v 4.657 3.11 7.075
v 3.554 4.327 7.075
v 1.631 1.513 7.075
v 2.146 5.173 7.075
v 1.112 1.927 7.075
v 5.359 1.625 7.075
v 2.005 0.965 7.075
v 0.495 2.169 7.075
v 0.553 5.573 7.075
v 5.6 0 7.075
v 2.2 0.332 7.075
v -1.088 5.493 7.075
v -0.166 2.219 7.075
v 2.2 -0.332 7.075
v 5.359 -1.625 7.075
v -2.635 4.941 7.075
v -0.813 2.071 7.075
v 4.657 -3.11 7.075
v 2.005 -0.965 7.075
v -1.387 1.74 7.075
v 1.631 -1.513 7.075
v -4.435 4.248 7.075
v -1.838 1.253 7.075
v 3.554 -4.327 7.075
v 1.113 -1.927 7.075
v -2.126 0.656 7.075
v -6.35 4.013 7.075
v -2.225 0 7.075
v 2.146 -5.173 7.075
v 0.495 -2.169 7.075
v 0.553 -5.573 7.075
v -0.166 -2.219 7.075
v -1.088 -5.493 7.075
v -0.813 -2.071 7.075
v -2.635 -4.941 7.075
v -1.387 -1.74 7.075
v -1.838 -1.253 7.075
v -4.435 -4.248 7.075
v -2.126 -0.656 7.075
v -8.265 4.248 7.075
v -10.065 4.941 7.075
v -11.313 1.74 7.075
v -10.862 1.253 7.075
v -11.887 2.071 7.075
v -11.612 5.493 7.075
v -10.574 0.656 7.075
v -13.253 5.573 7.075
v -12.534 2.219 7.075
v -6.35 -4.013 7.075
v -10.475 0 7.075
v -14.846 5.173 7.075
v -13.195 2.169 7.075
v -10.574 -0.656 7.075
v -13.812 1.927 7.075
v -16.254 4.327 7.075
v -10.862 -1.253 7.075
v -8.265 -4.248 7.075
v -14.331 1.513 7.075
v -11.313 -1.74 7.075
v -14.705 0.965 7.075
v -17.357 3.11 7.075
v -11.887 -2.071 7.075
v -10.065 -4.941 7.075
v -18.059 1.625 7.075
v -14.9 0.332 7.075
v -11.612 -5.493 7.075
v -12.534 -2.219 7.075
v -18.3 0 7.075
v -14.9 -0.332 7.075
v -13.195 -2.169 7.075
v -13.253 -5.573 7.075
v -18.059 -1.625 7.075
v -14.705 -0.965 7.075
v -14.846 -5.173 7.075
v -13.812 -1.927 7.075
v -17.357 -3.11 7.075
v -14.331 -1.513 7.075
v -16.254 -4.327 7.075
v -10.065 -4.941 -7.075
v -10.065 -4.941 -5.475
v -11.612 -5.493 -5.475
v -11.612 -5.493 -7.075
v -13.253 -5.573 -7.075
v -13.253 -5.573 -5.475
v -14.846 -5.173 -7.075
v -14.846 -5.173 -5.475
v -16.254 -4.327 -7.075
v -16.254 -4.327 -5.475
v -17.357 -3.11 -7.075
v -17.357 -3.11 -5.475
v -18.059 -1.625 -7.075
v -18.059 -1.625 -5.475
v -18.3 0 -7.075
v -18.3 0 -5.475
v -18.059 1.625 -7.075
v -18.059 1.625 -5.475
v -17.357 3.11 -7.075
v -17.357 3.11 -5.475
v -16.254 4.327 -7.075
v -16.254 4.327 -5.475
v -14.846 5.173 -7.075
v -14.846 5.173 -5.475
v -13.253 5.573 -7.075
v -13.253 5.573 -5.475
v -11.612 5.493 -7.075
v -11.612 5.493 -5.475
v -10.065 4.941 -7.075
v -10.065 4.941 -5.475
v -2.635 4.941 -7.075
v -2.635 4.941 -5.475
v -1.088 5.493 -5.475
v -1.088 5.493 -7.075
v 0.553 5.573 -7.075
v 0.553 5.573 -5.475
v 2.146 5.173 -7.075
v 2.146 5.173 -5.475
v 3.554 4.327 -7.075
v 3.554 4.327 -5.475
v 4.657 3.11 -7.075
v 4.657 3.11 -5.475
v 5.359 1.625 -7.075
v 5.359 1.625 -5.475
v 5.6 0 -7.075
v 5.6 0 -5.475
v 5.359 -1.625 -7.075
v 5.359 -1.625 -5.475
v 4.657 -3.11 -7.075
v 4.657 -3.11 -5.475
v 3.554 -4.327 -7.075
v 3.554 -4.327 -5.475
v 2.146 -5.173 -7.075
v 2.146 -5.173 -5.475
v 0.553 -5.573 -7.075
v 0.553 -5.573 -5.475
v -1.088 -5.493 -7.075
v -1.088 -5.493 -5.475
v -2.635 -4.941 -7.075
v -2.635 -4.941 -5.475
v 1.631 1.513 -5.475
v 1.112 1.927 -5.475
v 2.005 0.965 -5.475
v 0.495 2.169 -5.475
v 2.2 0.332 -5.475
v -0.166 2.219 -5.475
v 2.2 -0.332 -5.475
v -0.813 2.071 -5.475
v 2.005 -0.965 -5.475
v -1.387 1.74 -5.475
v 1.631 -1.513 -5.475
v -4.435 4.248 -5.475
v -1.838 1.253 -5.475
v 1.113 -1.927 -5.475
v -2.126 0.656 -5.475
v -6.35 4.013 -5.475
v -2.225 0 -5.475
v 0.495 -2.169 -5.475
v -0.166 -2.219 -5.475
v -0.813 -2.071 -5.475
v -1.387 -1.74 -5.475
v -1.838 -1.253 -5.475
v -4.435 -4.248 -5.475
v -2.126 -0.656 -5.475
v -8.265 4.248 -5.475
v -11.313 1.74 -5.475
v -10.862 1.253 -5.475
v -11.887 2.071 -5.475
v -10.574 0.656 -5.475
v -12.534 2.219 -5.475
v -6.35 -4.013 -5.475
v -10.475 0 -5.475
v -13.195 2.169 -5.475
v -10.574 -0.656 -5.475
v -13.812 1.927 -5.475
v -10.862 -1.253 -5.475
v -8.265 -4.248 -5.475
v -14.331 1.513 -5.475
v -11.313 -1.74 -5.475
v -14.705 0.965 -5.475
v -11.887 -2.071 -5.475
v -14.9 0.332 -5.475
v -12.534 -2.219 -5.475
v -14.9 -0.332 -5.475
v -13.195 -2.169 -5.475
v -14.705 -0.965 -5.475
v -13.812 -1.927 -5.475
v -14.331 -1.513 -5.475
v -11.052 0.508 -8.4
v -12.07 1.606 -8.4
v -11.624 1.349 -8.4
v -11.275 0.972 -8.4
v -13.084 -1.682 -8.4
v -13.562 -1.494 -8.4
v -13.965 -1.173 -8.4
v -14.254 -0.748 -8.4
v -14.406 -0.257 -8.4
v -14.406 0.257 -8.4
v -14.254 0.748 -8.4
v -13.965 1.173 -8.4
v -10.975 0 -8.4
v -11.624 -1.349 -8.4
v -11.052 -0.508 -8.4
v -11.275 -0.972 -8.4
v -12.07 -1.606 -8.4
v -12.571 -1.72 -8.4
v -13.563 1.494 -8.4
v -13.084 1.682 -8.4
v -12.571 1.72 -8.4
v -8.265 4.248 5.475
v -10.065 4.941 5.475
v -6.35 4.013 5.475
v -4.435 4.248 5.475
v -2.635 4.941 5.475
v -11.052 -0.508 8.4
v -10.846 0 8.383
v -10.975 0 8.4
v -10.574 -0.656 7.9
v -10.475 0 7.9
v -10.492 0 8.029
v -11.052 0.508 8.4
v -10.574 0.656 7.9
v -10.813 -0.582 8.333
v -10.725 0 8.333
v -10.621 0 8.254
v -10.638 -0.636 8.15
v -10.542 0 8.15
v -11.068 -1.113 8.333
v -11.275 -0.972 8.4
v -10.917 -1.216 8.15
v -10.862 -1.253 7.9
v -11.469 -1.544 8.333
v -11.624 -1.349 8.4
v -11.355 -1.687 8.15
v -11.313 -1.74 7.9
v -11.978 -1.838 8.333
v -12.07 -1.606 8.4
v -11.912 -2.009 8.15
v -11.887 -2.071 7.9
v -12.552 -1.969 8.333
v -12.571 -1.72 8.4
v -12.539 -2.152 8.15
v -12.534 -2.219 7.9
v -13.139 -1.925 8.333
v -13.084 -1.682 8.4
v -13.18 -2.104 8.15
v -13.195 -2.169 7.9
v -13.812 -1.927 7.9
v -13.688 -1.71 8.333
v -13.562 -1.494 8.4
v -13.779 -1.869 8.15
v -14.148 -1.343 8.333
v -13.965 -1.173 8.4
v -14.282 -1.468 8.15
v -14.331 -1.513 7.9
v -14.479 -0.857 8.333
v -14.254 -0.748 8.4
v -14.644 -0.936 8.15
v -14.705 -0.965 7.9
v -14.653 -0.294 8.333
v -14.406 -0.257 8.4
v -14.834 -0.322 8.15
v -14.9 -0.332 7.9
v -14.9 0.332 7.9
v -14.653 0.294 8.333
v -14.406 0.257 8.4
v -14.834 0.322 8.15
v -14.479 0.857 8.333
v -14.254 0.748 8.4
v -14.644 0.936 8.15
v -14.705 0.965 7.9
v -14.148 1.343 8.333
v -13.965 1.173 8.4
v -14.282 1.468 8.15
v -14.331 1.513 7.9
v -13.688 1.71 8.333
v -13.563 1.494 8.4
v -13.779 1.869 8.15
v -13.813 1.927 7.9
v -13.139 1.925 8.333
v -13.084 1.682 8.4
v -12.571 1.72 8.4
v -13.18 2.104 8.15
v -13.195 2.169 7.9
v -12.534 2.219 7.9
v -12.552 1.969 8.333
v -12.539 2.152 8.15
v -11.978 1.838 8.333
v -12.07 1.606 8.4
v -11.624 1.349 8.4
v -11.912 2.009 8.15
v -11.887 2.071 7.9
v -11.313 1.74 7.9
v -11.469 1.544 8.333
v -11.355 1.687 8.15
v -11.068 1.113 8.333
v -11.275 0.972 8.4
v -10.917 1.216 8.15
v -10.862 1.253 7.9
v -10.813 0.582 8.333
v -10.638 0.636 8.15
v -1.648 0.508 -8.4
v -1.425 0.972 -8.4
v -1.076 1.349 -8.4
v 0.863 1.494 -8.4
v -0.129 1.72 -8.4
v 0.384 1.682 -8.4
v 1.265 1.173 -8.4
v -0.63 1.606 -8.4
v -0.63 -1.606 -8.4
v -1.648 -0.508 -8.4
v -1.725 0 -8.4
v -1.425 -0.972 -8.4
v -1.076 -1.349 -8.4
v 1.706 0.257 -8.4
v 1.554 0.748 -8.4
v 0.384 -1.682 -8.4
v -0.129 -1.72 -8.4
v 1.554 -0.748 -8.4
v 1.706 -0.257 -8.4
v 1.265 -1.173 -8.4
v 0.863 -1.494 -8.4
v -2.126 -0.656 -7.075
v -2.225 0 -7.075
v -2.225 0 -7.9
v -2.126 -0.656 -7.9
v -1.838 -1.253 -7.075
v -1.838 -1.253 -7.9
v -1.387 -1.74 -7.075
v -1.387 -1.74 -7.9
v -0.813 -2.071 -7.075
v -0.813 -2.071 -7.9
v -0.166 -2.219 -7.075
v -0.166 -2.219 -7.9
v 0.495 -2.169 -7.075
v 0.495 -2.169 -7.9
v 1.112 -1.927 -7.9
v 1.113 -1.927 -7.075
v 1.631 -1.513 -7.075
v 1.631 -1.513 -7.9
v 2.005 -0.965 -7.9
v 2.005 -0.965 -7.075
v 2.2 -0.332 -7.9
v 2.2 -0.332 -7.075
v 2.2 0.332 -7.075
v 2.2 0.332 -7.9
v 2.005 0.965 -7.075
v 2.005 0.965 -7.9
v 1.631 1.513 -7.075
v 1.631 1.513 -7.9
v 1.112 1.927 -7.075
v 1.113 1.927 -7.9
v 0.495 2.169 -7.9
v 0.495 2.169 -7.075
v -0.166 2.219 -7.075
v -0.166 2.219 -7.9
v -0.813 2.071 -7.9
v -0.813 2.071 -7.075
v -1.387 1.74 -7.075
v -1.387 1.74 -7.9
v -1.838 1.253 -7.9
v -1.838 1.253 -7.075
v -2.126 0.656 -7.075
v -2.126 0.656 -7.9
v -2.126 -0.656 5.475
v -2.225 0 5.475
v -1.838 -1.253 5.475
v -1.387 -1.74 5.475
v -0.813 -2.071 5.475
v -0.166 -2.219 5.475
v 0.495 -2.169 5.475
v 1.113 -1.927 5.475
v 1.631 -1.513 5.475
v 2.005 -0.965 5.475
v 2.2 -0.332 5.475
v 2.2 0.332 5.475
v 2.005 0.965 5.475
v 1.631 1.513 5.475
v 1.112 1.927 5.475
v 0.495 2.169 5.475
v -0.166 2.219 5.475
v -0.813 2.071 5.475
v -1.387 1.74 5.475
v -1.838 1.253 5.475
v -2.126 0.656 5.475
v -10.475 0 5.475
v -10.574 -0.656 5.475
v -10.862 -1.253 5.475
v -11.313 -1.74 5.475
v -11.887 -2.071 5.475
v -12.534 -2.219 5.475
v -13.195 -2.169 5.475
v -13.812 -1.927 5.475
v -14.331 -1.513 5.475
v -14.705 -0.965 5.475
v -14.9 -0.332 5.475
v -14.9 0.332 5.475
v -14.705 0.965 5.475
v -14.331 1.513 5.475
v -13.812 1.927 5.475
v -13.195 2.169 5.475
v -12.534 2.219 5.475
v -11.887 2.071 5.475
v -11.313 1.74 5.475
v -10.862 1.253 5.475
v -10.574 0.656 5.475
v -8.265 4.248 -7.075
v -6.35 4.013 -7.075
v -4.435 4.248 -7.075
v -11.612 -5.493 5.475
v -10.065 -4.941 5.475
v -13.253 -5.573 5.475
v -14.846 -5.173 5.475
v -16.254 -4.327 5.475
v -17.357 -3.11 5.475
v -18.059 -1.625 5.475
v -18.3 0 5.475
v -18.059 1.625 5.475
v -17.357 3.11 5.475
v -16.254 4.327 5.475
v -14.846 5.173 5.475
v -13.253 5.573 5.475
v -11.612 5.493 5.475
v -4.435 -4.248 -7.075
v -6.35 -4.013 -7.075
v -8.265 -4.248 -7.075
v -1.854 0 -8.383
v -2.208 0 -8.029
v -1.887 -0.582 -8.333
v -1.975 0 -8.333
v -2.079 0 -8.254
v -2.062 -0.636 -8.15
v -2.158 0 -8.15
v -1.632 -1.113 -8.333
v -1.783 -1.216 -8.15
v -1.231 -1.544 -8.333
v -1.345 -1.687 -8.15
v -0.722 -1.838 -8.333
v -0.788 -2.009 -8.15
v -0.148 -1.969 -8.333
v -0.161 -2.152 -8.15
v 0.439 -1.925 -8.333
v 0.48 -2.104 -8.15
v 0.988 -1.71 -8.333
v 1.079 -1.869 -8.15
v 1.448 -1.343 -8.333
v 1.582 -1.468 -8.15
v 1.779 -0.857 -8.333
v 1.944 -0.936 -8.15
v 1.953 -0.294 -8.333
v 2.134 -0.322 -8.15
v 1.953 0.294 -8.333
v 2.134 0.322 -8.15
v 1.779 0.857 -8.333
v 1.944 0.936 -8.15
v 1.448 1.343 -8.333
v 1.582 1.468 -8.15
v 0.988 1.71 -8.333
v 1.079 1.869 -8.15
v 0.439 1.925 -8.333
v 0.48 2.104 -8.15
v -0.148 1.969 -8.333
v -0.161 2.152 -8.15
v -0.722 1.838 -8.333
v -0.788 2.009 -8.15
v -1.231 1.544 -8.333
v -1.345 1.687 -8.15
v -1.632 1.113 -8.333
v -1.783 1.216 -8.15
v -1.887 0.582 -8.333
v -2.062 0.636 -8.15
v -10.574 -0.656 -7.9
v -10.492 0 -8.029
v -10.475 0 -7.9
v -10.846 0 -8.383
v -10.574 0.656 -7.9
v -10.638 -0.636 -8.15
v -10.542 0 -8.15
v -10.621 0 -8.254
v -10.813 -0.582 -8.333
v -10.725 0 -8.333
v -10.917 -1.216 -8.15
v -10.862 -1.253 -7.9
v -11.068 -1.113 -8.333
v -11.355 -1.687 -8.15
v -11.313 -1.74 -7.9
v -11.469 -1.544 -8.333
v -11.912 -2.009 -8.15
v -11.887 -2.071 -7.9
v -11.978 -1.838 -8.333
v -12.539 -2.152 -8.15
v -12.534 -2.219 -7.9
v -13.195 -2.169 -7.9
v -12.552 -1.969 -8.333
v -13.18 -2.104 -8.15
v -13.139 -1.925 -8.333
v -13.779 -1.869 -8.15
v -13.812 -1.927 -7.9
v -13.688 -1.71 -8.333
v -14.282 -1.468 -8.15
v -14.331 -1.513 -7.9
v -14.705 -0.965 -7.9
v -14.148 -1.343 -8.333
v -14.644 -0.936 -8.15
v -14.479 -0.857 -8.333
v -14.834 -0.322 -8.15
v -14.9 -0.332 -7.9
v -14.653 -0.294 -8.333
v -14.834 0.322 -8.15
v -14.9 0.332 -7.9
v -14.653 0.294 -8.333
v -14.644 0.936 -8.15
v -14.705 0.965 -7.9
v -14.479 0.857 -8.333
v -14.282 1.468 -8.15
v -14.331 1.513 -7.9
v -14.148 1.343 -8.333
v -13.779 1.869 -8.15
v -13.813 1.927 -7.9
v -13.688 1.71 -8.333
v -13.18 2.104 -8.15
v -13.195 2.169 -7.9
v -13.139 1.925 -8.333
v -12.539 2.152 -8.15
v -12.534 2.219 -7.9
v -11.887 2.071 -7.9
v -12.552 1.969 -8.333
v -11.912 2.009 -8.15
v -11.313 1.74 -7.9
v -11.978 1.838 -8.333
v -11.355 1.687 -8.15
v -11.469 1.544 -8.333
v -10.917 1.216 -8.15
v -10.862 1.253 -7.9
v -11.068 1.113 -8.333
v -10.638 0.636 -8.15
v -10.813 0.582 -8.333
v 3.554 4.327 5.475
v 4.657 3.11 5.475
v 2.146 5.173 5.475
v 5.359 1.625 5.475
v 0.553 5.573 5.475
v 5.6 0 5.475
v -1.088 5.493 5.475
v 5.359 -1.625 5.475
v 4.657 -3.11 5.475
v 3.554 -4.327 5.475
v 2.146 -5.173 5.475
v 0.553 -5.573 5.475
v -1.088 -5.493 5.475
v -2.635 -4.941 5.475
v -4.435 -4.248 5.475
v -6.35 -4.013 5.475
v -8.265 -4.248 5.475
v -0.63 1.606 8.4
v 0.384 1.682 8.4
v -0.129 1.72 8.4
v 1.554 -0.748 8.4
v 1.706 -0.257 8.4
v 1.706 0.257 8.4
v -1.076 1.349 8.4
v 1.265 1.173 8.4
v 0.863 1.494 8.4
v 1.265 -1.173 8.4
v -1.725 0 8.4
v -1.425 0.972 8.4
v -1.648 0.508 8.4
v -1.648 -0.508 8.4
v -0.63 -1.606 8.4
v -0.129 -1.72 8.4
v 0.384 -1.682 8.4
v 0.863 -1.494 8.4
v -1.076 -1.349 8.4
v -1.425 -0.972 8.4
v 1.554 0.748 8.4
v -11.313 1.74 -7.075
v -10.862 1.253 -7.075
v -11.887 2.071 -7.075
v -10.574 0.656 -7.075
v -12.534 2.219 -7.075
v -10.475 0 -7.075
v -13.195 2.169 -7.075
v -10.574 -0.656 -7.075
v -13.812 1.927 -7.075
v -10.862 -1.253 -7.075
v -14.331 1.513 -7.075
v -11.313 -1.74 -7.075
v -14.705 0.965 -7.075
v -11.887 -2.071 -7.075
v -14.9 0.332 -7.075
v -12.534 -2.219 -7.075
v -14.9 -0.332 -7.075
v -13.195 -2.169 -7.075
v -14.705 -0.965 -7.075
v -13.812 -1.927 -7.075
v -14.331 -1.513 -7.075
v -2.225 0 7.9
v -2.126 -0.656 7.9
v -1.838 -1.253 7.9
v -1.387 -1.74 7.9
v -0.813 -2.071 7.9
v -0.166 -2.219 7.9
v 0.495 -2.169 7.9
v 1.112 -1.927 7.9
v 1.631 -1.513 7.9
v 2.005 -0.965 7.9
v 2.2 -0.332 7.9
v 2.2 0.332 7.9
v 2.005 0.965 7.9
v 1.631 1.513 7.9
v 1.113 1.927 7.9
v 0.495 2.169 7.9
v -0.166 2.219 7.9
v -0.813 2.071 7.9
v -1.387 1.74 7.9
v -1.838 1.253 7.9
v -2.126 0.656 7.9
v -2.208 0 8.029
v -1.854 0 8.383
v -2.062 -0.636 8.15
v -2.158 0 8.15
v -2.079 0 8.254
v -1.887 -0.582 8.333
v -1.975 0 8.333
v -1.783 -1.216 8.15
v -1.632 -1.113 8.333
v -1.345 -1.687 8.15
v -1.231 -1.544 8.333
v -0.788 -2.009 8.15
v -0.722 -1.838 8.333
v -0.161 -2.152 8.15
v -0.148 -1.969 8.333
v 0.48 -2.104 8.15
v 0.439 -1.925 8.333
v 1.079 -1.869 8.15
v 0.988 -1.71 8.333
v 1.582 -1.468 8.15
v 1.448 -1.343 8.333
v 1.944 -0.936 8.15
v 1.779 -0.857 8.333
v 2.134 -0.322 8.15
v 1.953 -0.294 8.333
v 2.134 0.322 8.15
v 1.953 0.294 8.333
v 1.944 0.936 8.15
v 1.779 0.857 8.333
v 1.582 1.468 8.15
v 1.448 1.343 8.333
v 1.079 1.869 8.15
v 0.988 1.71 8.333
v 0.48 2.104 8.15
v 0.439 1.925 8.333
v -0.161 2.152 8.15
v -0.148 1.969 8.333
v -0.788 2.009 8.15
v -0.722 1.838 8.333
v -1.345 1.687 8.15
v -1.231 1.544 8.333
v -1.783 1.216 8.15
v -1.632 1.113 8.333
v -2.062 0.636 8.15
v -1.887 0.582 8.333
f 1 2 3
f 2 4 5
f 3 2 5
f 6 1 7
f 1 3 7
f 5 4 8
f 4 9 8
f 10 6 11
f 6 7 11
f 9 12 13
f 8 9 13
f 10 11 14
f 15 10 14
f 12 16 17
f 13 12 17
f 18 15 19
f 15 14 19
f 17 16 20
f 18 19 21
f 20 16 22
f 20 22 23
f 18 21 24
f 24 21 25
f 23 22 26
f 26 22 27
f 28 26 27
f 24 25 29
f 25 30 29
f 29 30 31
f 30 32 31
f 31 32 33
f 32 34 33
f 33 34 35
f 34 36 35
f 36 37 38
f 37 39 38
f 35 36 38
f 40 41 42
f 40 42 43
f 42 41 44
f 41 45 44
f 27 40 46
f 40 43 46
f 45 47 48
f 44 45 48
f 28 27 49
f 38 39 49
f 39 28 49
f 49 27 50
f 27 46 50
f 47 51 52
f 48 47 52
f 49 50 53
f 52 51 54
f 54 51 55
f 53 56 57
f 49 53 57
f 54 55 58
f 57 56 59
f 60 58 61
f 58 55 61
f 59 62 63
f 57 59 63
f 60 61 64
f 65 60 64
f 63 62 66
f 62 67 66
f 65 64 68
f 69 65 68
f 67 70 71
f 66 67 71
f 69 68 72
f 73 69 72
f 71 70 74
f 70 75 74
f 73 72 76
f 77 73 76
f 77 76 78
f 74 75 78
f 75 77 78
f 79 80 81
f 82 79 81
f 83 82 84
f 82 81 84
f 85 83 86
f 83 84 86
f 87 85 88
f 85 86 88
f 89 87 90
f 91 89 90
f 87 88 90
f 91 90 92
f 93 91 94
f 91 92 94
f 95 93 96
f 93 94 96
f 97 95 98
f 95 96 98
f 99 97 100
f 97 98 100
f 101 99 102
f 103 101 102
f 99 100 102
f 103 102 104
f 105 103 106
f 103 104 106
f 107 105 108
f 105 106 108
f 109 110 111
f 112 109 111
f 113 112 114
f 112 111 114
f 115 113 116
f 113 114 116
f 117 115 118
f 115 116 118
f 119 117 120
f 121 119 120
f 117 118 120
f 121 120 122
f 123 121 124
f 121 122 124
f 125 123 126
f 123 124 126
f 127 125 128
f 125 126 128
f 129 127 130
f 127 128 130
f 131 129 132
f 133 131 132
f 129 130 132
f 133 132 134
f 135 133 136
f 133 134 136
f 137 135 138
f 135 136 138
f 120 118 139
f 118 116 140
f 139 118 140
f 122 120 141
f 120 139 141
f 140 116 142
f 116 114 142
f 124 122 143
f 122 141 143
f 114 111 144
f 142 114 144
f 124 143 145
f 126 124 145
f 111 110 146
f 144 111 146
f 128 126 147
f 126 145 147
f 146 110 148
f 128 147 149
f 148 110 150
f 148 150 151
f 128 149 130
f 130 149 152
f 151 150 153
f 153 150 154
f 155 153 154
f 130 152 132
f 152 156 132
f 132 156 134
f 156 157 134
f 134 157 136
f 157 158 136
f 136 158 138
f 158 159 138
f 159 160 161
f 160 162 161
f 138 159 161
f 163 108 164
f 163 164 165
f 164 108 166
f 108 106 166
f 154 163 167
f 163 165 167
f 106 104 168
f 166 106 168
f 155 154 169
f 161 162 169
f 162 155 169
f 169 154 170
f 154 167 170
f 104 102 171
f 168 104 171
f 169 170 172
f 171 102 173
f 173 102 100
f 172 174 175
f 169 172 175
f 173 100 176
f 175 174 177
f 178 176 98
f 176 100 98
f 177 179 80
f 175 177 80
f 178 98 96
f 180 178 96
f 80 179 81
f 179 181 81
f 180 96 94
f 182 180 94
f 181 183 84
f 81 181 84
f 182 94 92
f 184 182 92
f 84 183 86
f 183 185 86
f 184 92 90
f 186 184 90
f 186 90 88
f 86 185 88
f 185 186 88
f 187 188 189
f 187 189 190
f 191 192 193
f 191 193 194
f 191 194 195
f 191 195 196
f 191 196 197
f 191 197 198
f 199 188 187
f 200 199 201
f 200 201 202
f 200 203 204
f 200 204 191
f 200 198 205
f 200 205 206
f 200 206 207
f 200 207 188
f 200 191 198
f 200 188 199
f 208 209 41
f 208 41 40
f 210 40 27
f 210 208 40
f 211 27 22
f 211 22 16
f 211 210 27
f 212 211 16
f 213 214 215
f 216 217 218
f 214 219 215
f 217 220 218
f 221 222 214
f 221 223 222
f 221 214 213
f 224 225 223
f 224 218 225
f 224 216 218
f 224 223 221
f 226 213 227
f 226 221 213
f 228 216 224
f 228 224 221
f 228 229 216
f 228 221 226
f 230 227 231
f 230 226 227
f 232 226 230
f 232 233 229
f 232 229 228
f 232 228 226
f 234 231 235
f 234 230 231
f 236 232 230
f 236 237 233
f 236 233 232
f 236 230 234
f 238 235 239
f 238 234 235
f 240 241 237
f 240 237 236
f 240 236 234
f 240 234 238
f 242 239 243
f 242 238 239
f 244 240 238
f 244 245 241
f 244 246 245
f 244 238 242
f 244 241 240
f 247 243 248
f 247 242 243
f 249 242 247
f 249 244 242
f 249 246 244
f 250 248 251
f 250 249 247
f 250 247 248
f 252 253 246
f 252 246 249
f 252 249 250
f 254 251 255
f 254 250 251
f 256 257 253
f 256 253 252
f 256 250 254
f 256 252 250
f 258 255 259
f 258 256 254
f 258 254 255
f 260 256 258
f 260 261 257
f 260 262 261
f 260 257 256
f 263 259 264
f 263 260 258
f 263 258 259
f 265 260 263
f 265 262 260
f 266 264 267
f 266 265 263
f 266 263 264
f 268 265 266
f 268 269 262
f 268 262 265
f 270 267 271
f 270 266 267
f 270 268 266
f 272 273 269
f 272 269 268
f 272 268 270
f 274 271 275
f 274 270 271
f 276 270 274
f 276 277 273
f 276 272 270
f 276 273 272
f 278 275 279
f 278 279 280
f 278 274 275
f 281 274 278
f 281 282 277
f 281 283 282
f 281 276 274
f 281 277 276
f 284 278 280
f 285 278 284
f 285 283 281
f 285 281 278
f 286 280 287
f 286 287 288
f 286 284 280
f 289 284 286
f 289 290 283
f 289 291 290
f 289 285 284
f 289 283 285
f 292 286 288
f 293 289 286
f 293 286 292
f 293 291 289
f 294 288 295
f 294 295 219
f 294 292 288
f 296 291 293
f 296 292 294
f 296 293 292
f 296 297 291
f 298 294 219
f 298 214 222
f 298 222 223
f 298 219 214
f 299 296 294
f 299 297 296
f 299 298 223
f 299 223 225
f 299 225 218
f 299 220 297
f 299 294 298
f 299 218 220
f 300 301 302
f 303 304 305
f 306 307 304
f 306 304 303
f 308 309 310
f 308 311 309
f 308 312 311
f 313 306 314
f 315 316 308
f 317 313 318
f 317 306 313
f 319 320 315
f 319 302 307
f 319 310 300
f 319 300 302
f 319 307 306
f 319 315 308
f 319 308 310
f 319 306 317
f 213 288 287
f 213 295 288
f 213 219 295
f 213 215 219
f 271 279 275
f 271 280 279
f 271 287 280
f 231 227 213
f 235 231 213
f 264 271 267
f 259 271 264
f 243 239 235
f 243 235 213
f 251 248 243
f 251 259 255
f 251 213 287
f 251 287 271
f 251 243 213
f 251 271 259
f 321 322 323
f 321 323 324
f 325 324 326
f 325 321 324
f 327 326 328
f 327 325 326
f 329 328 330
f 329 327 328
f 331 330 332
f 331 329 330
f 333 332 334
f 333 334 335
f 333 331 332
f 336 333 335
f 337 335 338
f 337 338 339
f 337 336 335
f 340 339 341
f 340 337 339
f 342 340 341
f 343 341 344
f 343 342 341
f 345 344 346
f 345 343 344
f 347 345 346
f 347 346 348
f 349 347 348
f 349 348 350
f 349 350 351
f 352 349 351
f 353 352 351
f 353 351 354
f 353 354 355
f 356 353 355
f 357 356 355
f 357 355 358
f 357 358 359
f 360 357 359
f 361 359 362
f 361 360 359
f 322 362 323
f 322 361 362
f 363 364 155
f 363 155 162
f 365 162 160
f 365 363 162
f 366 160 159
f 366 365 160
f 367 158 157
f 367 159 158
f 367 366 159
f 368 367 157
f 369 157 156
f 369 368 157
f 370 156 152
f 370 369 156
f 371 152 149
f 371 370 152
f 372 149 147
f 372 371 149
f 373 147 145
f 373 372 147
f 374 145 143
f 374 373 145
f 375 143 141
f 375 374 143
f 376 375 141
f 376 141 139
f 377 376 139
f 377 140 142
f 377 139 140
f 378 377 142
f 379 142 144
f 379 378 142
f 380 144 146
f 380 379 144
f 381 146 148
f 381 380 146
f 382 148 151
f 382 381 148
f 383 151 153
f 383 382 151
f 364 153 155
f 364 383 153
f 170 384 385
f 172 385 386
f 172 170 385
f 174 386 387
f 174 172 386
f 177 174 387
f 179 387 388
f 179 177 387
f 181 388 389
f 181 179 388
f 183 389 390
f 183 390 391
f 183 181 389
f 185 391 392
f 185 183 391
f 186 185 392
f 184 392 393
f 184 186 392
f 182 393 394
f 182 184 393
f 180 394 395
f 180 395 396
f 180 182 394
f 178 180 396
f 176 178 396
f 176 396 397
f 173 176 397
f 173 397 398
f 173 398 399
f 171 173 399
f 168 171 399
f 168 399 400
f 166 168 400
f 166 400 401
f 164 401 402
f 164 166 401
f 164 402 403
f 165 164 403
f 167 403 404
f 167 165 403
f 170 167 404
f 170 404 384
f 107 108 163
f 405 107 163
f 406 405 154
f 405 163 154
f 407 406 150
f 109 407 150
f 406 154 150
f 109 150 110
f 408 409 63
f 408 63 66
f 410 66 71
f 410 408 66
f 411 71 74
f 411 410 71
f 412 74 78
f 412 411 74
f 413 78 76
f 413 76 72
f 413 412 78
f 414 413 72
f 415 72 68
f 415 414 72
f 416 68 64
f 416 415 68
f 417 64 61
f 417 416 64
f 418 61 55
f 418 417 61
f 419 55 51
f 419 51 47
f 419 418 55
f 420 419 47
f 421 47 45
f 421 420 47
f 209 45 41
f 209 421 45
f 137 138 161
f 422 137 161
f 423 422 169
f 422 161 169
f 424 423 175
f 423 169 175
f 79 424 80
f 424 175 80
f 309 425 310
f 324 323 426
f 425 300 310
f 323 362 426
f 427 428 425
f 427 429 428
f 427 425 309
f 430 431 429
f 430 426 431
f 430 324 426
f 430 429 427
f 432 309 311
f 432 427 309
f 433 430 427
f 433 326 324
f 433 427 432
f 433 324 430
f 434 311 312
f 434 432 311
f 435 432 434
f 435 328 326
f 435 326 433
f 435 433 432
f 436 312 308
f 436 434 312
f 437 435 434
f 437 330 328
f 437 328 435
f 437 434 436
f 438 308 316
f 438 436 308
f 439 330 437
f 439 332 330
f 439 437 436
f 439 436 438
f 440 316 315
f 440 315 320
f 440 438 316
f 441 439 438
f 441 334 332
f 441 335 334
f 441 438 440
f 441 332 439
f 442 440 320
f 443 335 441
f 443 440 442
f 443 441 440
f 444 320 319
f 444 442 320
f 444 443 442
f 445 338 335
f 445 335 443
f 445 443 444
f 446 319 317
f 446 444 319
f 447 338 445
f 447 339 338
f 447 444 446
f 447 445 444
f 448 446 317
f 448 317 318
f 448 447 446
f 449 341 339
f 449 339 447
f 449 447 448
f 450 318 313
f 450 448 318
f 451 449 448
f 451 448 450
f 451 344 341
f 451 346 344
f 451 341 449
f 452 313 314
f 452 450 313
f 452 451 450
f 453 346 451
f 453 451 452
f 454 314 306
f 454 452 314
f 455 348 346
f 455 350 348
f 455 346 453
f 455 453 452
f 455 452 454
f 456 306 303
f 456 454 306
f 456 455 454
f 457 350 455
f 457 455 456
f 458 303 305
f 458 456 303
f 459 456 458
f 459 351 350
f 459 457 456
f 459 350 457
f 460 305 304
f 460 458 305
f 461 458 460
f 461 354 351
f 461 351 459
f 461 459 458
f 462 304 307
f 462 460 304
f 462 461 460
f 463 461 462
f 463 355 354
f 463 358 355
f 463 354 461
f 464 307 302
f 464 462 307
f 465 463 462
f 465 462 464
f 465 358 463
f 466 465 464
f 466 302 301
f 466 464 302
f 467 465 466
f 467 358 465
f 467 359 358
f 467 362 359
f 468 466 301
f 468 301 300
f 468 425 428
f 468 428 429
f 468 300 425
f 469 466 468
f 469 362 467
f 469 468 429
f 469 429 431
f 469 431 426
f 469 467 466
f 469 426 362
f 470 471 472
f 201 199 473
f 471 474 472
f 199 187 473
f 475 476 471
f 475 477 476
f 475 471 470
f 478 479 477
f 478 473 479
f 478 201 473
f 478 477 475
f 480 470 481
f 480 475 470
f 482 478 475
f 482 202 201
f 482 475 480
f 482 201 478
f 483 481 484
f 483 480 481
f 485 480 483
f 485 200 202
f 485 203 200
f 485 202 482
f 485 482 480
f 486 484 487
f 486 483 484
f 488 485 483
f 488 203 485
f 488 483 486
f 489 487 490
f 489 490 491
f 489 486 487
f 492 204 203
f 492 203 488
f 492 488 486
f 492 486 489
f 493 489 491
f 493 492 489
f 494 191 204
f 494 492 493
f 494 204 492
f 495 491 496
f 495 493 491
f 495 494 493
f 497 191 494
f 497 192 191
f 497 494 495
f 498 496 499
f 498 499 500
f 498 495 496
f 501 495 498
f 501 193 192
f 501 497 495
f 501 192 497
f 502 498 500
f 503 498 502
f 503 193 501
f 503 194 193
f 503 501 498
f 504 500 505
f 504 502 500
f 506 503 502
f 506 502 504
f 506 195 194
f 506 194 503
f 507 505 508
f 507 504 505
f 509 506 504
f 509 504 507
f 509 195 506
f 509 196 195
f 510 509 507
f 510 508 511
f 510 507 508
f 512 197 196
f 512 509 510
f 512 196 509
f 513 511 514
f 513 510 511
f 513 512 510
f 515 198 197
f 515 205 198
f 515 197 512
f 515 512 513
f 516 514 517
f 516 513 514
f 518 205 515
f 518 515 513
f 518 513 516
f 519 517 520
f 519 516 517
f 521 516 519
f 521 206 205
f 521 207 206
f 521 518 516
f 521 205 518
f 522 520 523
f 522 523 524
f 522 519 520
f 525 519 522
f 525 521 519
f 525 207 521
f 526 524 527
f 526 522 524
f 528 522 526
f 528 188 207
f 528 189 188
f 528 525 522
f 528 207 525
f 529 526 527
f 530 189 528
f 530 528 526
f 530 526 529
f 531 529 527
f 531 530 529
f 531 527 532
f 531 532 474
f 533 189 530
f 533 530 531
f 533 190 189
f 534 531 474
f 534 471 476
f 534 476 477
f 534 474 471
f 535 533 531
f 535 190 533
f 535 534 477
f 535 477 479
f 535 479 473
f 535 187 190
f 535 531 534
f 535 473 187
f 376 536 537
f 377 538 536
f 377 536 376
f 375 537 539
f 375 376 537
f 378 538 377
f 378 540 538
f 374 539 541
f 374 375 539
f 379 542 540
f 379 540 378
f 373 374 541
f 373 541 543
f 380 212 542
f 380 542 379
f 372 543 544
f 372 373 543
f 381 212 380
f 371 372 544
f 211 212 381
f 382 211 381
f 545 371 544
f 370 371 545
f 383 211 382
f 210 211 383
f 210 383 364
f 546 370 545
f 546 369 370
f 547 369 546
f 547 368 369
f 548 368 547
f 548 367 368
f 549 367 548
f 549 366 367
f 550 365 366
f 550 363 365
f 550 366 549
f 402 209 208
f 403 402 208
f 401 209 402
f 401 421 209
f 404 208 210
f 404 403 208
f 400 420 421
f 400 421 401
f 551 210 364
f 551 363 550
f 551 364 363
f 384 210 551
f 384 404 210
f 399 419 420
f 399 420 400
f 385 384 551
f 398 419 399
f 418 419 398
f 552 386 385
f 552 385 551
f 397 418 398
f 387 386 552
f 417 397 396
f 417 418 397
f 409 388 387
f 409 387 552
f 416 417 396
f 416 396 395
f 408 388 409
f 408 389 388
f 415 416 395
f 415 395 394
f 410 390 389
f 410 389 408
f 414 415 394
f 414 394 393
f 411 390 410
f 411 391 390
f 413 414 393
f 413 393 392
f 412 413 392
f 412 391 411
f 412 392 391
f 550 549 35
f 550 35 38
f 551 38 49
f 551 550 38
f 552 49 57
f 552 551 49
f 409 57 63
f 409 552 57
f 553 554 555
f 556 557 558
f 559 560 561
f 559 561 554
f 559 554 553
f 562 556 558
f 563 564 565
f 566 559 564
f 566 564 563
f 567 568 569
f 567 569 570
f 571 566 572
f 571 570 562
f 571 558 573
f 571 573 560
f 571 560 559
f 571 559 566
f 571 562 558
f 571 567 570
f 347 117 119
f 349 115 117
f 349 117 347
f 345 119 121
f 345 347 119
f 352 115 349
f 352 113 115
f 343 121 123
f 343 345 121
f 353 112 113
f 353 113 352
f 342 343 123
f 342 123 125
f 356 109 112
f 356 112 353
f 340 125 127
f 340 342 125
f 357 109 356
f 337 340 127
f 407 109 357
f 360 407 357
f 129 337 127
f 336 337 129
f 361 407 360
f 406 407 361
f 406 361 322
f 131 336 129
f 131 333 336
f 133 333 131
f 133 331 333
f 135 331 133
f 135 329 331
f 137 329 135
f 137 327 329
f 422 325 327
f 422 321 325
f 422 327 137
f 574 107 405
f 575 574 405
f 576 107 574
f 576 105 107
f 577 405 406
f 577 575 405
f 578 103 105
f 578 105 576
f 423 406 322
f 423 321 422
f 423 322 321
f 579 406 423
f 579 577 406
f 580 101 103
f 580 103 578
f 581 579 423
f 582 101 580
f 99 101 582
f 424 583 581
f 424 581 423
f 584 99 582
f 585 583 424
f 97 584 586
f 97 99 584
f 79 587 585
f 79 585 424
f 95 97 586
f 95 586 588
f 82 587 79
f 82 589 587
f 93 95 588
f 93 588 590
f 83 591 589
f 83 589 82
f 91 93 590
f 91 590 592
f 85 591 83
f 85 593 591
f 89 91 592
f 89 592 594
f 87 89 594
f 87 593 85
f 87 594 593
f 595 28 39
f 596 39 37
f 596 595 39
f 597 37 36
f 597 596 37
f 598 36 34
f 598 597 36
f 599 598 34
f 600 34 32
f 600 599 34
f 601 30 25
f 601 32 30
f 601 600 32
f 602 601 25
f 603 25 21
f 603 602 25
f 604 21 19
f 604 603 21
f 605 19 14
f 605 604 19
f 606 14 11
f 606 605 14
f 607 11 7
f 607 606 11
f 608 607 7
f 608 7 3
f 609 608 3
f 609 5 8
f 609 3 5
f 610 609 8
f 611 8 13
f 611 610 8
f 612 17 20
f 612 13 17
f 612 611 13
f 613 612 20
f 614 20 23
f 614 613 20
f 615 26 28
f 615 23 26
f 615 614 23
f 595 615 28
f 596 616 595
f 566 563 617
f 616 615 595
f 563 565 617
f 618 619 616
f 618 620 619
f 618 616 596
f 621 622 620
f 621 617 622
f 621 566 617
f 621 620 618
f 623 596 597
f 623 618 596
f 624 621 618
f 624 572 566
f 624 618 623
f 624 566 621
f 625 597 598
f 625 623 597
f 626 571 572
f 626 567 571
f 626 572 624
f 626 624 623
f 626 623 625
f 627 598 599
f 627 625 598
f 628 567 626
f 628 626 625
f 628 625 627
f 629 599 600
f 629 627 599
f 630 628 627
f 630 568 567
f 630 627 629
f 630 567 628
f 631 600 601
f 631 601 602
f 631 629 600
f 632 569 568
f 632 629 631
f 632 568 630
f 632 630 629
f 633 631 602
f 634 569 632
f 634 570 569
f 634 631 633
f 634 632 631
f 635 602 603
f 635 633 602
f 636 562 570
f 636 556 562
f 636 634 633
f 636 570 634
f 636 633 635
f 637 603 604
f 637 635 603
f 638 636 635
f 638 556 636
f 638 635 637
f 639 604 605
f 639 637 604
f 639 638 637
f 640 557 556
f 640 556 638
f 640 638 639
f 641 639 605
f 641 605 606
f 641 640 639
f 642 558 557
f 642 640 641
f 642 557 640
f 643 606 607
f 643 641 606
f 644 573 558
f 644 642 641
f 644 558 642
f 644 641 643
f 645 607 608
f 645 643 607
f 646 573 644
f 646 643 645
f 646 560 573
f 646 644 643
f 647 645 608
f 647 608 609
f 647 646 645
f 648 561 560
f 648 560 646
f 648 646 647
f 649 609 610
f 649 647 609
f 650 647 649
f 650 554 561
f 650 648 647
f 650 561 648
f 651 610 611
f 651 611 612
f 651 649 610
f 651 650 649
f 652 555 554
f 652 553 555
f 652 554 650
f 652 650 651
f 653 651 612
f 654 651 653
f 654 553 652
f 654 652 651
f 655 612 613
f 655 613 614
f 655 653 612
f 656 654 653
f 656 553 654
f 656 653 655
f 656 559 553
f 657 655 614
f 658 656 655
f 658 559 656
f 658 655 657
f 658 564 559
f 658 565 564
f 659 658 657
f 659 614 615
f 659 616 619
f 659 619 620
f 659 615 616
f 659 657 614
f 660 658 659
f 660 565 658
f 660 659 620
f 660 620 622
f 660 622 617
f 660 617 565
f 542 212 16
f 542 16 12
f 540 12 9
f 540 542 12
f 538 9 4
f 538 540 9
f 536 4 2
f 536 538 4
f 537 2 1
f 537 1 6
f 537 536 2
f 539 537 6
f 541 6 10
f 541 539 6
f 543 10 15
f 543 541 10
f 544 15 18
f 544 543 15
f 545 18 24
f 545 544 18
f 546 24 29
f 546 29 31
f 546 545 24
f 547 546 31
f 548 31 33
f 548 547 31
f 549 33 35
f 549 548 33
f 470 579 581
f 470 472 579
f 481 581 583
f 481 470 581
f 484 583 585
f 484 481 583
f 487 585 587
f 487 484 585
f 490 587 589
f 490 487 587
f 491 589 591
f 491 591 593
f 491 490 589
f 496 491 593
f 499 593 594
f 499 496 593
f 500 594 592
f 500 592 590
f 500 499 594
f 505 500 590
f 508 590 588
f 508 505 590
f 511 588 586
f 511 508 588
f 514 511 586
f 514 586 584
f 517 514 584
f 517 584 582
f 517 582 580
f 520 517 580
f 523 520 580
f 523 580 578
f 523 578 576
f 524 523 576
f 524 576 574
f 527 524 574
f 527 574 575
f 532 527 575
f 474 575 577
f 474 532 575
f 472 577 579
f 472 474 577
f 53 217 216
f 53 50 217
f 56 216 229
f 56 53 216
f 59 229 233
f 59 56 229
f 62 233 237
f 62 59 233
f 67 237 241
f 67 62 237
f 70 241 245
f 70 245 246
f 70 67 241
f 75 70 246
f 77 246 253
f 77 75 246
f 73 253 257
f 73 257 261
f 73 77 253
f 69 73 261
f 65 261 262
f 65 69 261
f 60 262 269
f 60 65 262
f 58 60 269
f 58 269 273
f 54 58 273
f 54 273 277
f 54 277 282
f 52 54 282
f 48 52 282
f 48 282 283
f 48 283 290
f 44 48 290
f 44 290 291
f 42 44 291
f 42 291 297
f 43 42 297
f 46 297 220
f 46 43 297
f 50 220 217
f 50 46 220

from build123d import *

# Parameters (mm, degrees)
SKETCH3_R           = 2.225
BOSS_EXTRUDE1_DEPTH = 1.6


with BuildPart() as part:
    # Sketch1 → Revolve1 (revolve)
    with BuildSketch(Plane(origin=(0, 0, 0), x_dir=(1, 0, 0), z_dir=(0, 1, 0))):
        with BuildLine():
            Line((0, -8.4), (0, 8.4))
            Line((0, 8.4), (1.725, 8.4))
            ThreePointArc((1.725, 8.4), (2.078553391, 8.253553391), (2.225, 7.9))
            Line((2.225, 7.9), (2.225, -7.9))
            ThreePointArc((2.225, -7.9), (2.078553391, -8.253553391), (1.725, -8.4))
            Line((1.725, -8.4), (0, -8.4))
        make_face()
    revolve(axis=Axis((0, 0, -9.24), (0, 0, 1)))



with BuildPart() as body_2:
    # Sketch2 → Revolve2 (revolve)
    with BuildSketch(Plane.XZ):
        with BuildLine():
            Line((-12.7, 8.4), (-14.425, 8.4))
            ThreePointArc((-14.425, 8.4), (-14.778553391, 8.253553391), (-14.925, 7.9))
            Line((-14.925, 7.9), (-14.925, -7.9))
            ThreePointArc((-14.925, -7.9), (-14.778553391, -8.253553391), (-14.425, -8.4))
            Line((-14.425, -8.4), (-12.7, -8.4))
            Line((-12.7, -8.4), (-12.7, 8.4))
        make_face()
    revolve(axis=Axis((-12.7, 0, 8.4), (0, 0, -1)))


with BuildPart() as part_1:
    add(part.part)

    add(body_2.part)  # Boss-Extrude1 merges body 2
    # Sketch3 → Boss-Extrude1 (add)
    with BuildSketch(Plane(origin=(0, 0, -5.475), x_dir=(0, -1, 0), z_dir=(0, 0, -1))):
        with BuildLine():
            ThreePointArc((-4.941202509, 2.635245294), (0, -5.6), (4.941202509, 2.635245294))
            ThreePointArc((4.941202509, 2.635245294), (4.012533333, 6.35), (4.941202509, 10.064754706))
            ThreePointArc((4.941202509, 10.064754706), (0, 18.3), (-4.941202509, 10.064754706))
            ThreePointArc((-4.941202509, 10.064754706), (-4.012533333, 6.35), (-4.941202509, 2.635245294))
        make_face()
        Circle(SKETCH3_R, mode=Mode.SUBTRACT)
        with Locations((0, 12.7)):
            Circle(SKETCH3_R, mode=Mode.SUBTRACT)
    boss_extrude1 = extrude(amount=BOSS_EXTRUDE1_DEPTH)

    # Mirror1: Boss-Extrude1 across plane
    add(boss_extrude1.mirror(Plane.XY))


solid = part_1.part
